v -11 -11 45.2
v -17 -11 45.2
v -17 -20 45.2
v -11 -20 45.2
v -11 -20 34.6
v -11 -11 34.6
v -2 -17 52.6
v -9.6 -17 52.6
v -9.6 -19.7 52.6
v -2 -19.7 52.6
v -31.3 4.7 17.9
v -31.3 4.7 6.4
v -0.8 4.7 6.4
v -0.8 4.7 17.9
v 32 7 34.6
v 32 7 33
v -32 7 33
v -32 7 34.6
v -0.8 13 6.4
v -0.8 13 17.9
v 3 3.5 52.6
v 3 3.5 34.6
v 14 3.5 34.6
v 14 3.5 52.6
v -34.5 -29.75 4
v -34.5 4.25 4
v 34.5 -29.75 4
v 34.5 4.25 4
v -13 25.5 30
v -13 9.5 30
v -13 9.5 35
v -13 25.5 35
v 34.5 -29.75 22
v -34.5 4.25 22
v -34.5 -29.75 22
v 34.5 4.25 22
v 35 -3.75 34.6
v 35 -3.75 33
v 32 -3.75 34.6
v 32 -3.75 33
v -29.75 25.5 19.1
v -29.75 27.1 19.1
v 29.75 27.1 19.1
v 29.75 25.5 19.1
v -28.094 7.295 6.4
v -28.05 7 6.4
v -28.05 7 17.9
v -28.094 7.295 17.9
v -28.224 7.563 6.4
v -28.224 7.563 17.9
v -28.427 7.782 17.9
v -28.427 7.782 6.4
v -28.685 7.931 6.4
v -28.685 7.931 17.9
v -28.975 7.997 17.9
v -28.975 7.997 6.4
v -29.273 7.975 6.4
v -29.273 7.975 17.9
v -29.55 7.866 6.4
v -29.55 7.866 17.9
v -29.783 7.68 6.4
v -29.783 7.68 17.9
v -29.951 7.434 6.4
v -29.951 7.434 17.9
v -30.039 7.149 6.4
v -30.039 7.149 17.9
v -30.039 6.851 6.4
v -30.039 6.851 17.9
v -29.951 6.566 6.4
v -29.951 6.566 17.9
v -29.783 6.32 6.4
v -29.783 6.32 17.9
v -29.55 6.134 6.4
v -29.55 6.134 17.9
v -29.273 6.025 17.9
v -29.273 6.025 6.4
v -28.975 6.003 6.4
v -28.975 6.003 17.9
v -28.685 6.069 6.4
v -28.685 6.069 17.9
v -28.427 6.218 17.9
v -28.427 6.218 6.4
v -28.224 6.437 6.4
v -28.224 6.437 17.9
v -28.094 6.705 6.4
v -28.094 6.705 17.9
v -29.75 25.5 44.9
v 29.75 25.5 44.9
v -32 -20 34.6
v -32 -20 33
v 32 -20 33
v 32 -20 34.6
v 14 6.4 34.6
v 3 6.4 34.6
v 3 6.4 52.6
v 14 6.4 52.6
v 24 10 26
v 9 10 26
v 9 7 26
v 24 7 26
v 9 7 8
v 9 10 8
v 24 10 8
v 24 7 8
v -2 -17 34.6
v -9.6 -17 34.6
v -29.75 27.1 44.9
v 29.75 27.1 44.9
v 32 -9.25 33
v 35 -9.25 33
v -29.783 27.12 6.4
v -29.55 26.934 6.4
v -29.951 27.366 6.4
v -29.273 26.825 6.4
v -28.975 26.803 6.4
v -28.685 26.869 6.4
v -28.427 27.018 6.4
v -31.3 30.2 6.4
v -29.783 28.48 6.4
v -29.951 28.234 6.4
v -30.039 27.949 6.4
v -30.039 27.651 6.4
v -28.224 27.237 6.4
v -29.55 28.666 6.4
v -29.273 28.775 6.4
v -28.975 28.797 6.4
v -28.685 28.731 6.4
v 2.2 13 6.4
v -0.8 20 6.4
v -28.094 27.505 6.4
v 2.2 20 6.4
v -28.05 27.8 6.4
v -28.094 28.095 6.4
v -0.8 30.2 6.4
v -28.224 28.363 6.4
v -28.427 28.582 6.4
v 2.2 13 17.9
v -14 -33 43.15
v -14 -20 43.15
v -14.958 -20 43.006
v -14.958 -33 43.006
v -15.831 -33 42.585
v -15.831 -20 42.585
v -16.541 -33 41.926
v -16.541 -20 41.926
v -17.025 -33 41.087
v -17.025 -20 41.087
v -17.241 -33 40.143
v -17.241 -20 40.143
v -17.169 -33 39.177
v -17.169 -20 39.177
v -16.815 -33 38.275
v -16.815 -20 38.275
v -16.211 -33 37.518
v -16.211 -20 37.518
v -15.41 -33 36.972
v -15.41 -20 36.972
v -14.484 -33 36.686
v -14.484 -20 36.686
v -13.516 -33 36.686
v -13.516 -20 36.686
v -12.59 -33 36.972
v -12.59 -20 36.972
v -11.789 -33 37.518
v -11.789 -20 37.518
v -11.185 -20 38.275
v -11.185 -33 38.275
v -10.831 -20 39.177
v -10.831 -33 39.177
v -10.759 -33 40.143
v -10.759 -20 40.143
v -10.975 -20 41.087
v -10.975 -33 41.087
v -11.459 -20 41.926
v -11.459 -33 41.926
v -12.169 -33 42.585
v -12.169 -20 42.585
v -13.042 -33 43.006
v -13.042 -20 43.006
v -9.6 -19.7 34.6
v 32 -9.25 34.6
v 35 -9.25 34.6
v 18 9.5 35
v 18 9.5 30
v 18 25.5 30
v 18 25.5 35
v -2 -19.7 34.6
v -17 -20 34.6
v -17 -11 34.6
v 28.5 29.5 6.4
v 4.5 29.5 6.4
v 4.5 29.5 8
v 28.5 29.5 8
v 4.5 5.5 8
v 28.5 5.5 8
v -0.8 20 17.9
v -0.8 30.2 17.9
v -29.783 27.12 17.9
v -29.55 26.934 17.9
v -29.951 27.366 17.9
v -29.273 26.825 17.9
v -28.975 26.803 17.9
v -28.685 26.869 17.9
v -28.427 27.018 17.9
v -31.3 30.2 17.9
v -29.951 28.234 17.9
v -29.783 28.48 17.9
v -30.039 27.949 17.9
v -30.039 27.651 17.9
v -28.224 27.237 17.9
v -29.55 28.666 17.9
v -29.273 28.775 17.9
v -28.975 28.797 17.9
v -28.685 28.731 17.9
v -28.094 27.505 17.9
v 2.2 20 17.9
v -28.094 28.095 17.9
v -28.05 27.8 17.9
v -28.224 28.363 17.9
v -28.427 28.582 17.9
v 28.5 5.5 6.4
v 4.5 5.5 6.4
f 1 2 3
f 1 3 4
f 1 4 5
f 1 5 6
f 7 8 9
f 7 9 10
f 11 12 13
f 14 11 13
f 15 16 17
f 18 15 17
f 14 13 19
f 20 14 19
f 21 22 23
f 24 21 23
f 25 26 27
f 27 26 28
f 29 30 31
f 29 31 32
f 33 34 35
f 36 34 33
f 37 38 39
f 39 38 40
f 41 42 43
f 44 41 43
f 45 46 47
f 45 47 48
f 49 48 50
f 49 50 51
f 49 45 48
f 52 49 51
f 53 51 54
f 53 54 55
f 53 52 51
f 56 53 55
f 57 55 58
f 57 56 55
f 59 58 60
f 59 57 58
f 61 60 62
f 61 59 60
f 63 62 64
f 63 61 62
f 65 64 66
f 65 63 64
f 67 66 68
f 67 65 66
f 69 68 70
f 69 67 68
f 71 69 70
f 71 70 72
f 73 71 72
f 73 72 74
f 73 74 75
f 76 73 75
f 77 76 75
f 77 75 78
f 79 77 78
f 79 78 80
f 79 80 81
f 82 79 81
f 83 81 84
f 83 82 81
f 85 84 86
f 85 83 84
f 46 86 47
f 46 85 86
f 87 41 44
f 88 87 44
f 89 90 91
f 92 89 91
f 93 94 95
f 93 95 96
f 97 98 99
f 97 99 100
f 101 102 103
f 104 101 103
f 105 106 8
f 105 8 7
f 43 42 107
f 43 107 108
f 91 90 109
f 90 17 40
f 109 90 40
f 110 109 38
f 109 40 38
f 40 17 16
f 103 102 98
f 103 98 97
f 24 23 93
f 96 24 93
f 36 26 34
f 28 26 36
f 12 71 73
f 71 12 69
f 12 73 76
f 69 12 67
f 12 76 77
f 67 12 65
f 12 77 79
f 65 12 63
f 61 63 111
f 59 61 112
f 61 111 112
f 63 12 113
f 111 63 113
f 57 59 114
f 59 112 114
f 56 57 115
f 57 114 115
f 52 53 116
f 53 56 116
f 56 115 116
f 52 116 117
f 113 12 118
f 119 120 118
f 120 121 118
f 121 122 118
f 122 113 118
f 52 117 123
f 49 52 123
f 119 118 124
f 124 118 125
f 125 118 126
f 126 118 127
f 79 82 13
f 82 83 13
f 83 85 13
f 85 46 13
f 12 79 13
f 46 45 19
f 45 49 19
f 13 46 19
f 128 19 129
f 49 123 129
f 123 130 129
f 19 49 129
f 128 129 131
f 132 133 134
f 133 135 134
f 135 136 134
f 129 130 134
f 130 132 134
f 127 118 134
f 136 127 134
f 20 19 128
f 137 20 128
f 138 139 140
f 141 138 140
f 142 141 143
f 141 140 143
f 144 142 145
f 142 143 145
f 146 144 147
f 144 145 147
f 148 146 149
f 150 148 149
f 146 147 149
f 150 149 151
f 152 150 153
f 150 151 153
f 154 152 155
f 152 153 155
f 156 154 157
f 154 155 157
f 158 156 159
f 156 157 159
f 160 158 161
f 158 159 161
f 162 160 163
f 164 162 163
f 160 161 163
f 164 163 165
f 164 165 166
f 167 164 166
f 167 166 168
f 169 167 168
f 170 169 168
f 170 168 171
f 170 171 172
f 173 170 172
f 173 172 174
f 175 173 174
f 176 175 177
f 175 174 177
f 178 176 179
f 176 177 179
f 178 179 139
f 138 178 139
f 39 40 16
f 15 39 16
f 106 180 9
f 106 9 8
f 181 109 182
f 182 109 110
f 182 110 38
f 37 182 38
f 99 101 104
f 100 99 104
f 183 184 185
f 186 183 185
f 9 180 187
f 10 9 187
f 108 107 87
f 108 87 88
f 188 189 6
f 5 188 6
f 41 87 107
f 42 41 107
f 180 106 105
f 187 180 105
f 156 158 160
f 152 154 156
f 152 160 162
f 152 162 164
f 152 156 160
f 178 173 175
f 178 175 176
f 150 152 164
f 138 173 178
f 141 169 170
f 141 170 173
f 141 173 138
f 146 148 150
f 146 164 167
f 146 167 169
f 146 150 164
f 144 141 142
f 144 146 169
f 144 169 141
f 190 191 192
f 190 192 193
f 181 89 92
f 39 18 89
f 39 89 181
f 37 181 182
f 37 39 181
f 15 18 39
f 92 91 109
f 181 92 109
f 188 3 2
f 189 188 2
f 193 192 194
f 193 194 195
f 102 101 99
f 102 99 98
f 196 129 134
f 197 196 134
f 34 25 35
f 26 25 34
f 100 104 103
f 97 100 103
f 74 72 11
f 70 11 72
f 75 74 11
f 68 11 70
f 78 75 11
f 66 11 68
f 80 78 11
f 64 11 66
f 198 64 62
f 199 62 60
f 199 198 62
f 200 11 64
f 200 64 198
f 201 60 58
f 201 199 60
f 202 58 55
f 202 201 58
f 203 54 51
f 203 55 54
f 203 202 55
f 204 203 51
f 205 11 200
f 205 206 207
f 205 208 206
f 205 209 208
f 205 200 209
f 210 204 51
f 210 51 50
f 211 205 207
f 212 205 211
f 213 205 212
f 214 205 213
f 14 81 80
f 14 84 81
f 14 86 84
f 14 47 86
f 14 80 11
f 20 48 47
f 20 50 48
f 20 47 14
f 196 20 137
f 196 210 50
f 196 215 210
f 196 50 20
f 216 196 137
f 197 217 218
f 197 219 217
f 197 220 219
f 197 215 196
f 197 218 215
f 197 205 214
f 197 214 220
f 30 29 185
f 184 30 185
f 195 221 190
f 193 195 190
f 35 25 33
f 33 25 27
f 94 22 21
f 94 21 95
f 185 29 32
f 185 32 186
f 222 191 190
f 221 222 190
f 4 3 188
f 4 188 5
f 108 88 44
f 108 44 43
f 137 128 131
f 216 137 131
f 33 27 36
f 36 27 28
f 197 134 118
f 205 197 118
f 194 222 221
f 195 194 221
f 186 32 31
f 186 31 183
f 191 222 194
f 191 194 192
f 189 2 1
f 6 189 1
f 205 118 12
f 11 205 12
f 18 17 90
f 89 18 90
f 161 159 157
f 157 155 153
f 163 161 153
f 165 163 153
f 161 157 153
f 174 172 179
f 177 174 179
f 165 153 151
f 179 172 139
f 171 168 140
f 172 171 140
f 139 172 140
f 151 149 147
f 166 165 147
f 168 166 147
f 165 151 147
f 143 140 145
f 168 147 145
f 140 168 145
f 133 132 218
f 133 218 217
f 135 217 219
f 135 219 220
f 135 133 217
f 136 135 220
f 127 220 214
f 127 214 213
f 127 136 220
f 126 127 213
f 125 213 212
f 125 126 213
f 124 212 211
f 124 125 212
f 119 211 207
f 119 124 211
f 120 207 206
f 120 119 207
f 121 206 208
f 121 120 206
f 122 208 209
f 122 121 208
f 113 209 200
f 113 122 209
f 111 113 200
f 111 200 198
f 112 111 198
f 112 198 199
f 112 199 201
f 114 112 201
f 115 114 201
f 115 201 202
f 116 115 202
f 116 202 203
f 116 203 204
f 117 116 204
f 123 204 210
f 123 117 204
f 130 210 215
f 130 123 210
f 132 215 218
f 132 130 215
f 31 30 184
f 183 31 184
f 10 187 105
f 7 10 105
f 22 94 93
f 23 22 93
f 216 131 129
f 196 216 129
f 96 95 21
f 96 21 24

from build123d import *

# Parameters (mm, degrees)
BATTERY_START                               = 4
BATTERY_HOLDER_69_X_34_X_18_PROFILE_W       = 69
BATTERY_HOLDER_69_X_34_X_18_PROFILE_H       = 34
BATTERY_HOLDER_69_X_34_X_18_DEPTH           = 18
YBX_START                                   = 6.4
YBX_BOARD_24_X_24_PROFILE_W                 = 24
YBX_BOARD_24_X_24_PROFILE_H                 = 24
YBX_BOARD_24_X_24_DEPTH                     = 1.6
YBX_START_2                                 = 8
YBX_JUMPER_ALLOWANCE_PROFILE_W              = 15
YBX_JUMPER_ALLOWANCE_PROFILE_H              = 3
YBX_JUMPER_ALLOWANCE_DEPTH                  = 18
GNSS_START                                  = 6.4
GNSS_11_5_MM_HIGH_3_MM_PROJECTION_2_R       = 1
GNSS_11_5_MM_HIGH_3_MM_PROJECTION_D2_DEPTH  = 11.5
POWER_START                                 = 19.1
POWER_BOARD_59_5_X_25_8_PROFILE_W           = 59.5
POWER_BOARD_59_5_X_25_8_PROFILE_H           = 1.6
POWER_BOARD_59_5_X_25_8_DEPTH               = 25.8
POWER_START_2                               = 30
POWER_HORIZONTAL_CONNECTOR_ALLOWANCE_PRO_W  = 31
POWER_HORIZONTAL_CONNECTOR_ALLOWANCE_PRO_H  = 16
POWER_HORIZONTAL_CONNECTOR_ALLOWANCE_DEPTH  = 5
EORA_START                                  = 33
EORA_64_X_27_TOP_PROJECTION_3_X_5_5_DEPTH   = 1.6
EORA_START_2                                = 34.6
EORA_ANTENNA_HOUSING_6_X_9_X_10_6_PROFIL_W  = 6
EORA_ANTENNA_HOUSING_6_X_9_X_10_6_PROFIL_H  = 9
EORA_ANTENNA_HOUSING_6_X_9_X_10_6_DEPTH     = 10.6
D6_5_ANTENNA_PASSAGE_GAUGE_LENGTH_2_R       = 3.25
D6_5_ANTENNA_PASSAGE_GAUGE_LENGTH_NOT_DEPTH = 13
EORA_JUMPER_ALLOWANCE_A_PROFILE_W           = 7.6
EORA_JUMPER_ALLOWANCE_A_PROFILE_H           = 2.7
EORA_JUMPER_ALLOWANCE_A_DEPTH               = 18
EORA_JUMPER_ALLOWANCE_B_PROFILE_W           = 11
EORA_JUMPER_ALLOWANCE_B_PROFILE_H           = 2.9
EORA_JUMPER_ALLOWANCE_B_DEPTH               = 18


with BuildPart() as part:
    # Battery holder 69 x 34 x 18 profile → Battery holder 69 x 34 x 18 (new body)
    with BuildSketch(Plane.XY.offset(BATTERY_START)):
        with Locations((0, -12.75)):
            Rectangle(BATTERY_HOLDER_69_X_34_X_18_PROFILE_W, BATTERY_HOLDER_69_X_34_X_18_PROFILE_H)
    extrude(amount=BATTERY_HOLDER_69_X_34_X_18_DEPTH)


with BuildPart() as body_2:
    # YBX board 24 x 24 profile → YBX board 24 x 24 (new body)
    with BuildSketch(Plane.XY.offset(YBX_START)):
        with Locations((16.5, 17.5)):
            Rectangle(YBX_BOARD_24_X_24_PROFILE_W, YBX_BOARD_24_X_24_PROFILE_H)
    extrude(amount=YBX_BOARD_24_X_24_DEPTH)


with BuildPart() as body_3:
    # YBX jumper allowance profile → YBX jumper allowance (new body)
    with BuildSketch(Plane.XY.offset(YBX_START_2)):
        with Locations((16.5, 8.5)):
            Rectangle(YBX_JUMPER_ALLOWANCE_PROFILE_W, YBX_JUMPER_ALLOWANCE_PROFILE_H)
    extrude(amount=YBX_JUMPER_ALLOWANCE_DEPTH)


with BuildPart() as body_4:
    # GNSS 11.5 mm high - 3 mm projection  2 → GNSS 11.5 mm high - 3 mm projection - D2 (new body)
    with BuildSketch(Plane.XY.offset(GNSS_START)):
        Polygon((-31.3, 4.7), (-0.8, 4.7), (-0.8, 13), (2.2, 13), (2.2, 20), (-0.8, 20), (-0.8, 30.2), (-31.3, 30.2), align=None)
        with Locations((-29.05, 7)):
            Circle(GNSS_11_5_MM_HIGH_3_MM_PROJECTION_2_R, mode=Mode.SUBTRACT)
        with Locations((-29.05, 27.8)):
            Circle(GNSS_11_5_MM_HIGH_3_MM_PROJECTION_2_R, mode=Mode.SUBTRACT)
    extrude(amount=GNSS_11_5_MM_HIGH_3_MM_PROJECTION_D2_DEPTH)


with BuildPart() as body_5:
    # Power board 59.5 x 25.8 profile → Power board 59.5 x 25.8 (new body)
    with BuildSketch(Plane.XY.offset(POWER_START)):
        with Locations((0, 26.3)):
            Rectangle(POWER_BOARD_59_5_X_25_8_PROFILE_W, POWER_BOARD_59_5_X_25_8_PROFILE_H)
    extrude(amount=POWER_BOARD_59_5_X_25_8_DEPTH)


with BuildPart() as body_6:
    # Power horizontal connector allowance profile → Power horizontal connector allowance (new body)
    with BuildSketch(Plane.XY.offset(POWER_START_2)):
        with Locations((2.5, 17.5)):
            Rectangle(POWER_HORIZONTAL_CONNECTOR_ALLOWANCE_PRO_W, POWER_HORIZONTAL_CONNECTOR_ALLOWANCE_PRO_H)
    extrude(amount=POWER_HORIZONTAL_CONNECTOR_ALLOWANCE_DEPTH)


with BuildPart() as body_7:
    # EoRa 64 x 27 - top projection 3 x 5.5 profile → EoRa 64 x 27 - top projection 3 x 5.5 (new body)
    with BuildSketch(Plane.XY.offset(EORA_START)):
        Polygon((-32, -20), (32, -20), (32, -9.25), (35, -9.25), (35, -3.75), (32, -3.75), (32, 7), (-32, 7), align=None)
    extrude(amount=EORA_64_X_27_TOP_PROJECTION_3_X_5_5_DEPTH)


with BuildPart() as body_8:
    # EoRa antenna housing 6 x 9 x 10.6 profile → EoRa antenna housing 6 x 9 x 10.6 (new body)
    with BuildSketch(Plane.XY.offset(EORA_START_2)):
        with Locations((-14, -15.5)):
            Rectangle(EORA_ANTENNA_HOUSING_6_X_9_X_10_6_PROFIL_W, EORA_ANTENNA_HOUSING_6_X_9_X_10_6_PROFIL_H)
    extrude(amount=EORA_ANTENNA_HOUSING_6_X_9_X_10_6_DEPTH)


with BuildPart() as body_9:
    # D6.5 antenna passage gauge - length  2 → D6.5 antenna passage gauge - length not (new body)
    with BuildSketch(Plane.XZ.offset(20)):
        with Locations(Location((-14, 39.9, 0), (0, 0, 90))):
            Circle(D6_5_ANTENNA_PASSAGE_GAUGE_LENGTH_2_R)
    extrude(amount=D6_5_ANTENNA_PASSAGE_GAUGE_LENGTH_NOT_DEPTH)


with BuildPart() as body_10:
    # EoRa jumper allowance A profile → EoRa jumper allowance A (new body)
    with BuildSketch(Plane.XY.offset(EORA_START_2)):
        with Locations((-5.8, -18.35)):
            Rectangle(EORA_JUMPER_ALLOWANCE_A_PROFILE_W, EORA_JUMPER_ALLOWANCE_A_PROFILE_H)
    extrude(amount=EORA_JUMPER_ALLOWANCE_A_DEPTH)


with BuildPart() as body_11:
    # EoRa jumper allowance B profile → EoRa jumper allowance B (new body)
    with BuildSketch(Plane.XY.offset(EORA_START_2)):
        with Locations((8.5, 4.95)):
            Rectangle(EORA_JUMPER_ALLOWANCE_B_PROFILE_W, EORA_JUMPER_ALLOWANCE_B_PROFILE_H)
    extrude(amount=EORA_JUMPER_ALLOWANCE_B_DEPTH)


solid = Compound([part.part, body_2.part, body_3.part, body_4.part, body_5.part, body_6.part, body_7.part, body_8.part, body_9.part, body_10.part, body_11.part])
